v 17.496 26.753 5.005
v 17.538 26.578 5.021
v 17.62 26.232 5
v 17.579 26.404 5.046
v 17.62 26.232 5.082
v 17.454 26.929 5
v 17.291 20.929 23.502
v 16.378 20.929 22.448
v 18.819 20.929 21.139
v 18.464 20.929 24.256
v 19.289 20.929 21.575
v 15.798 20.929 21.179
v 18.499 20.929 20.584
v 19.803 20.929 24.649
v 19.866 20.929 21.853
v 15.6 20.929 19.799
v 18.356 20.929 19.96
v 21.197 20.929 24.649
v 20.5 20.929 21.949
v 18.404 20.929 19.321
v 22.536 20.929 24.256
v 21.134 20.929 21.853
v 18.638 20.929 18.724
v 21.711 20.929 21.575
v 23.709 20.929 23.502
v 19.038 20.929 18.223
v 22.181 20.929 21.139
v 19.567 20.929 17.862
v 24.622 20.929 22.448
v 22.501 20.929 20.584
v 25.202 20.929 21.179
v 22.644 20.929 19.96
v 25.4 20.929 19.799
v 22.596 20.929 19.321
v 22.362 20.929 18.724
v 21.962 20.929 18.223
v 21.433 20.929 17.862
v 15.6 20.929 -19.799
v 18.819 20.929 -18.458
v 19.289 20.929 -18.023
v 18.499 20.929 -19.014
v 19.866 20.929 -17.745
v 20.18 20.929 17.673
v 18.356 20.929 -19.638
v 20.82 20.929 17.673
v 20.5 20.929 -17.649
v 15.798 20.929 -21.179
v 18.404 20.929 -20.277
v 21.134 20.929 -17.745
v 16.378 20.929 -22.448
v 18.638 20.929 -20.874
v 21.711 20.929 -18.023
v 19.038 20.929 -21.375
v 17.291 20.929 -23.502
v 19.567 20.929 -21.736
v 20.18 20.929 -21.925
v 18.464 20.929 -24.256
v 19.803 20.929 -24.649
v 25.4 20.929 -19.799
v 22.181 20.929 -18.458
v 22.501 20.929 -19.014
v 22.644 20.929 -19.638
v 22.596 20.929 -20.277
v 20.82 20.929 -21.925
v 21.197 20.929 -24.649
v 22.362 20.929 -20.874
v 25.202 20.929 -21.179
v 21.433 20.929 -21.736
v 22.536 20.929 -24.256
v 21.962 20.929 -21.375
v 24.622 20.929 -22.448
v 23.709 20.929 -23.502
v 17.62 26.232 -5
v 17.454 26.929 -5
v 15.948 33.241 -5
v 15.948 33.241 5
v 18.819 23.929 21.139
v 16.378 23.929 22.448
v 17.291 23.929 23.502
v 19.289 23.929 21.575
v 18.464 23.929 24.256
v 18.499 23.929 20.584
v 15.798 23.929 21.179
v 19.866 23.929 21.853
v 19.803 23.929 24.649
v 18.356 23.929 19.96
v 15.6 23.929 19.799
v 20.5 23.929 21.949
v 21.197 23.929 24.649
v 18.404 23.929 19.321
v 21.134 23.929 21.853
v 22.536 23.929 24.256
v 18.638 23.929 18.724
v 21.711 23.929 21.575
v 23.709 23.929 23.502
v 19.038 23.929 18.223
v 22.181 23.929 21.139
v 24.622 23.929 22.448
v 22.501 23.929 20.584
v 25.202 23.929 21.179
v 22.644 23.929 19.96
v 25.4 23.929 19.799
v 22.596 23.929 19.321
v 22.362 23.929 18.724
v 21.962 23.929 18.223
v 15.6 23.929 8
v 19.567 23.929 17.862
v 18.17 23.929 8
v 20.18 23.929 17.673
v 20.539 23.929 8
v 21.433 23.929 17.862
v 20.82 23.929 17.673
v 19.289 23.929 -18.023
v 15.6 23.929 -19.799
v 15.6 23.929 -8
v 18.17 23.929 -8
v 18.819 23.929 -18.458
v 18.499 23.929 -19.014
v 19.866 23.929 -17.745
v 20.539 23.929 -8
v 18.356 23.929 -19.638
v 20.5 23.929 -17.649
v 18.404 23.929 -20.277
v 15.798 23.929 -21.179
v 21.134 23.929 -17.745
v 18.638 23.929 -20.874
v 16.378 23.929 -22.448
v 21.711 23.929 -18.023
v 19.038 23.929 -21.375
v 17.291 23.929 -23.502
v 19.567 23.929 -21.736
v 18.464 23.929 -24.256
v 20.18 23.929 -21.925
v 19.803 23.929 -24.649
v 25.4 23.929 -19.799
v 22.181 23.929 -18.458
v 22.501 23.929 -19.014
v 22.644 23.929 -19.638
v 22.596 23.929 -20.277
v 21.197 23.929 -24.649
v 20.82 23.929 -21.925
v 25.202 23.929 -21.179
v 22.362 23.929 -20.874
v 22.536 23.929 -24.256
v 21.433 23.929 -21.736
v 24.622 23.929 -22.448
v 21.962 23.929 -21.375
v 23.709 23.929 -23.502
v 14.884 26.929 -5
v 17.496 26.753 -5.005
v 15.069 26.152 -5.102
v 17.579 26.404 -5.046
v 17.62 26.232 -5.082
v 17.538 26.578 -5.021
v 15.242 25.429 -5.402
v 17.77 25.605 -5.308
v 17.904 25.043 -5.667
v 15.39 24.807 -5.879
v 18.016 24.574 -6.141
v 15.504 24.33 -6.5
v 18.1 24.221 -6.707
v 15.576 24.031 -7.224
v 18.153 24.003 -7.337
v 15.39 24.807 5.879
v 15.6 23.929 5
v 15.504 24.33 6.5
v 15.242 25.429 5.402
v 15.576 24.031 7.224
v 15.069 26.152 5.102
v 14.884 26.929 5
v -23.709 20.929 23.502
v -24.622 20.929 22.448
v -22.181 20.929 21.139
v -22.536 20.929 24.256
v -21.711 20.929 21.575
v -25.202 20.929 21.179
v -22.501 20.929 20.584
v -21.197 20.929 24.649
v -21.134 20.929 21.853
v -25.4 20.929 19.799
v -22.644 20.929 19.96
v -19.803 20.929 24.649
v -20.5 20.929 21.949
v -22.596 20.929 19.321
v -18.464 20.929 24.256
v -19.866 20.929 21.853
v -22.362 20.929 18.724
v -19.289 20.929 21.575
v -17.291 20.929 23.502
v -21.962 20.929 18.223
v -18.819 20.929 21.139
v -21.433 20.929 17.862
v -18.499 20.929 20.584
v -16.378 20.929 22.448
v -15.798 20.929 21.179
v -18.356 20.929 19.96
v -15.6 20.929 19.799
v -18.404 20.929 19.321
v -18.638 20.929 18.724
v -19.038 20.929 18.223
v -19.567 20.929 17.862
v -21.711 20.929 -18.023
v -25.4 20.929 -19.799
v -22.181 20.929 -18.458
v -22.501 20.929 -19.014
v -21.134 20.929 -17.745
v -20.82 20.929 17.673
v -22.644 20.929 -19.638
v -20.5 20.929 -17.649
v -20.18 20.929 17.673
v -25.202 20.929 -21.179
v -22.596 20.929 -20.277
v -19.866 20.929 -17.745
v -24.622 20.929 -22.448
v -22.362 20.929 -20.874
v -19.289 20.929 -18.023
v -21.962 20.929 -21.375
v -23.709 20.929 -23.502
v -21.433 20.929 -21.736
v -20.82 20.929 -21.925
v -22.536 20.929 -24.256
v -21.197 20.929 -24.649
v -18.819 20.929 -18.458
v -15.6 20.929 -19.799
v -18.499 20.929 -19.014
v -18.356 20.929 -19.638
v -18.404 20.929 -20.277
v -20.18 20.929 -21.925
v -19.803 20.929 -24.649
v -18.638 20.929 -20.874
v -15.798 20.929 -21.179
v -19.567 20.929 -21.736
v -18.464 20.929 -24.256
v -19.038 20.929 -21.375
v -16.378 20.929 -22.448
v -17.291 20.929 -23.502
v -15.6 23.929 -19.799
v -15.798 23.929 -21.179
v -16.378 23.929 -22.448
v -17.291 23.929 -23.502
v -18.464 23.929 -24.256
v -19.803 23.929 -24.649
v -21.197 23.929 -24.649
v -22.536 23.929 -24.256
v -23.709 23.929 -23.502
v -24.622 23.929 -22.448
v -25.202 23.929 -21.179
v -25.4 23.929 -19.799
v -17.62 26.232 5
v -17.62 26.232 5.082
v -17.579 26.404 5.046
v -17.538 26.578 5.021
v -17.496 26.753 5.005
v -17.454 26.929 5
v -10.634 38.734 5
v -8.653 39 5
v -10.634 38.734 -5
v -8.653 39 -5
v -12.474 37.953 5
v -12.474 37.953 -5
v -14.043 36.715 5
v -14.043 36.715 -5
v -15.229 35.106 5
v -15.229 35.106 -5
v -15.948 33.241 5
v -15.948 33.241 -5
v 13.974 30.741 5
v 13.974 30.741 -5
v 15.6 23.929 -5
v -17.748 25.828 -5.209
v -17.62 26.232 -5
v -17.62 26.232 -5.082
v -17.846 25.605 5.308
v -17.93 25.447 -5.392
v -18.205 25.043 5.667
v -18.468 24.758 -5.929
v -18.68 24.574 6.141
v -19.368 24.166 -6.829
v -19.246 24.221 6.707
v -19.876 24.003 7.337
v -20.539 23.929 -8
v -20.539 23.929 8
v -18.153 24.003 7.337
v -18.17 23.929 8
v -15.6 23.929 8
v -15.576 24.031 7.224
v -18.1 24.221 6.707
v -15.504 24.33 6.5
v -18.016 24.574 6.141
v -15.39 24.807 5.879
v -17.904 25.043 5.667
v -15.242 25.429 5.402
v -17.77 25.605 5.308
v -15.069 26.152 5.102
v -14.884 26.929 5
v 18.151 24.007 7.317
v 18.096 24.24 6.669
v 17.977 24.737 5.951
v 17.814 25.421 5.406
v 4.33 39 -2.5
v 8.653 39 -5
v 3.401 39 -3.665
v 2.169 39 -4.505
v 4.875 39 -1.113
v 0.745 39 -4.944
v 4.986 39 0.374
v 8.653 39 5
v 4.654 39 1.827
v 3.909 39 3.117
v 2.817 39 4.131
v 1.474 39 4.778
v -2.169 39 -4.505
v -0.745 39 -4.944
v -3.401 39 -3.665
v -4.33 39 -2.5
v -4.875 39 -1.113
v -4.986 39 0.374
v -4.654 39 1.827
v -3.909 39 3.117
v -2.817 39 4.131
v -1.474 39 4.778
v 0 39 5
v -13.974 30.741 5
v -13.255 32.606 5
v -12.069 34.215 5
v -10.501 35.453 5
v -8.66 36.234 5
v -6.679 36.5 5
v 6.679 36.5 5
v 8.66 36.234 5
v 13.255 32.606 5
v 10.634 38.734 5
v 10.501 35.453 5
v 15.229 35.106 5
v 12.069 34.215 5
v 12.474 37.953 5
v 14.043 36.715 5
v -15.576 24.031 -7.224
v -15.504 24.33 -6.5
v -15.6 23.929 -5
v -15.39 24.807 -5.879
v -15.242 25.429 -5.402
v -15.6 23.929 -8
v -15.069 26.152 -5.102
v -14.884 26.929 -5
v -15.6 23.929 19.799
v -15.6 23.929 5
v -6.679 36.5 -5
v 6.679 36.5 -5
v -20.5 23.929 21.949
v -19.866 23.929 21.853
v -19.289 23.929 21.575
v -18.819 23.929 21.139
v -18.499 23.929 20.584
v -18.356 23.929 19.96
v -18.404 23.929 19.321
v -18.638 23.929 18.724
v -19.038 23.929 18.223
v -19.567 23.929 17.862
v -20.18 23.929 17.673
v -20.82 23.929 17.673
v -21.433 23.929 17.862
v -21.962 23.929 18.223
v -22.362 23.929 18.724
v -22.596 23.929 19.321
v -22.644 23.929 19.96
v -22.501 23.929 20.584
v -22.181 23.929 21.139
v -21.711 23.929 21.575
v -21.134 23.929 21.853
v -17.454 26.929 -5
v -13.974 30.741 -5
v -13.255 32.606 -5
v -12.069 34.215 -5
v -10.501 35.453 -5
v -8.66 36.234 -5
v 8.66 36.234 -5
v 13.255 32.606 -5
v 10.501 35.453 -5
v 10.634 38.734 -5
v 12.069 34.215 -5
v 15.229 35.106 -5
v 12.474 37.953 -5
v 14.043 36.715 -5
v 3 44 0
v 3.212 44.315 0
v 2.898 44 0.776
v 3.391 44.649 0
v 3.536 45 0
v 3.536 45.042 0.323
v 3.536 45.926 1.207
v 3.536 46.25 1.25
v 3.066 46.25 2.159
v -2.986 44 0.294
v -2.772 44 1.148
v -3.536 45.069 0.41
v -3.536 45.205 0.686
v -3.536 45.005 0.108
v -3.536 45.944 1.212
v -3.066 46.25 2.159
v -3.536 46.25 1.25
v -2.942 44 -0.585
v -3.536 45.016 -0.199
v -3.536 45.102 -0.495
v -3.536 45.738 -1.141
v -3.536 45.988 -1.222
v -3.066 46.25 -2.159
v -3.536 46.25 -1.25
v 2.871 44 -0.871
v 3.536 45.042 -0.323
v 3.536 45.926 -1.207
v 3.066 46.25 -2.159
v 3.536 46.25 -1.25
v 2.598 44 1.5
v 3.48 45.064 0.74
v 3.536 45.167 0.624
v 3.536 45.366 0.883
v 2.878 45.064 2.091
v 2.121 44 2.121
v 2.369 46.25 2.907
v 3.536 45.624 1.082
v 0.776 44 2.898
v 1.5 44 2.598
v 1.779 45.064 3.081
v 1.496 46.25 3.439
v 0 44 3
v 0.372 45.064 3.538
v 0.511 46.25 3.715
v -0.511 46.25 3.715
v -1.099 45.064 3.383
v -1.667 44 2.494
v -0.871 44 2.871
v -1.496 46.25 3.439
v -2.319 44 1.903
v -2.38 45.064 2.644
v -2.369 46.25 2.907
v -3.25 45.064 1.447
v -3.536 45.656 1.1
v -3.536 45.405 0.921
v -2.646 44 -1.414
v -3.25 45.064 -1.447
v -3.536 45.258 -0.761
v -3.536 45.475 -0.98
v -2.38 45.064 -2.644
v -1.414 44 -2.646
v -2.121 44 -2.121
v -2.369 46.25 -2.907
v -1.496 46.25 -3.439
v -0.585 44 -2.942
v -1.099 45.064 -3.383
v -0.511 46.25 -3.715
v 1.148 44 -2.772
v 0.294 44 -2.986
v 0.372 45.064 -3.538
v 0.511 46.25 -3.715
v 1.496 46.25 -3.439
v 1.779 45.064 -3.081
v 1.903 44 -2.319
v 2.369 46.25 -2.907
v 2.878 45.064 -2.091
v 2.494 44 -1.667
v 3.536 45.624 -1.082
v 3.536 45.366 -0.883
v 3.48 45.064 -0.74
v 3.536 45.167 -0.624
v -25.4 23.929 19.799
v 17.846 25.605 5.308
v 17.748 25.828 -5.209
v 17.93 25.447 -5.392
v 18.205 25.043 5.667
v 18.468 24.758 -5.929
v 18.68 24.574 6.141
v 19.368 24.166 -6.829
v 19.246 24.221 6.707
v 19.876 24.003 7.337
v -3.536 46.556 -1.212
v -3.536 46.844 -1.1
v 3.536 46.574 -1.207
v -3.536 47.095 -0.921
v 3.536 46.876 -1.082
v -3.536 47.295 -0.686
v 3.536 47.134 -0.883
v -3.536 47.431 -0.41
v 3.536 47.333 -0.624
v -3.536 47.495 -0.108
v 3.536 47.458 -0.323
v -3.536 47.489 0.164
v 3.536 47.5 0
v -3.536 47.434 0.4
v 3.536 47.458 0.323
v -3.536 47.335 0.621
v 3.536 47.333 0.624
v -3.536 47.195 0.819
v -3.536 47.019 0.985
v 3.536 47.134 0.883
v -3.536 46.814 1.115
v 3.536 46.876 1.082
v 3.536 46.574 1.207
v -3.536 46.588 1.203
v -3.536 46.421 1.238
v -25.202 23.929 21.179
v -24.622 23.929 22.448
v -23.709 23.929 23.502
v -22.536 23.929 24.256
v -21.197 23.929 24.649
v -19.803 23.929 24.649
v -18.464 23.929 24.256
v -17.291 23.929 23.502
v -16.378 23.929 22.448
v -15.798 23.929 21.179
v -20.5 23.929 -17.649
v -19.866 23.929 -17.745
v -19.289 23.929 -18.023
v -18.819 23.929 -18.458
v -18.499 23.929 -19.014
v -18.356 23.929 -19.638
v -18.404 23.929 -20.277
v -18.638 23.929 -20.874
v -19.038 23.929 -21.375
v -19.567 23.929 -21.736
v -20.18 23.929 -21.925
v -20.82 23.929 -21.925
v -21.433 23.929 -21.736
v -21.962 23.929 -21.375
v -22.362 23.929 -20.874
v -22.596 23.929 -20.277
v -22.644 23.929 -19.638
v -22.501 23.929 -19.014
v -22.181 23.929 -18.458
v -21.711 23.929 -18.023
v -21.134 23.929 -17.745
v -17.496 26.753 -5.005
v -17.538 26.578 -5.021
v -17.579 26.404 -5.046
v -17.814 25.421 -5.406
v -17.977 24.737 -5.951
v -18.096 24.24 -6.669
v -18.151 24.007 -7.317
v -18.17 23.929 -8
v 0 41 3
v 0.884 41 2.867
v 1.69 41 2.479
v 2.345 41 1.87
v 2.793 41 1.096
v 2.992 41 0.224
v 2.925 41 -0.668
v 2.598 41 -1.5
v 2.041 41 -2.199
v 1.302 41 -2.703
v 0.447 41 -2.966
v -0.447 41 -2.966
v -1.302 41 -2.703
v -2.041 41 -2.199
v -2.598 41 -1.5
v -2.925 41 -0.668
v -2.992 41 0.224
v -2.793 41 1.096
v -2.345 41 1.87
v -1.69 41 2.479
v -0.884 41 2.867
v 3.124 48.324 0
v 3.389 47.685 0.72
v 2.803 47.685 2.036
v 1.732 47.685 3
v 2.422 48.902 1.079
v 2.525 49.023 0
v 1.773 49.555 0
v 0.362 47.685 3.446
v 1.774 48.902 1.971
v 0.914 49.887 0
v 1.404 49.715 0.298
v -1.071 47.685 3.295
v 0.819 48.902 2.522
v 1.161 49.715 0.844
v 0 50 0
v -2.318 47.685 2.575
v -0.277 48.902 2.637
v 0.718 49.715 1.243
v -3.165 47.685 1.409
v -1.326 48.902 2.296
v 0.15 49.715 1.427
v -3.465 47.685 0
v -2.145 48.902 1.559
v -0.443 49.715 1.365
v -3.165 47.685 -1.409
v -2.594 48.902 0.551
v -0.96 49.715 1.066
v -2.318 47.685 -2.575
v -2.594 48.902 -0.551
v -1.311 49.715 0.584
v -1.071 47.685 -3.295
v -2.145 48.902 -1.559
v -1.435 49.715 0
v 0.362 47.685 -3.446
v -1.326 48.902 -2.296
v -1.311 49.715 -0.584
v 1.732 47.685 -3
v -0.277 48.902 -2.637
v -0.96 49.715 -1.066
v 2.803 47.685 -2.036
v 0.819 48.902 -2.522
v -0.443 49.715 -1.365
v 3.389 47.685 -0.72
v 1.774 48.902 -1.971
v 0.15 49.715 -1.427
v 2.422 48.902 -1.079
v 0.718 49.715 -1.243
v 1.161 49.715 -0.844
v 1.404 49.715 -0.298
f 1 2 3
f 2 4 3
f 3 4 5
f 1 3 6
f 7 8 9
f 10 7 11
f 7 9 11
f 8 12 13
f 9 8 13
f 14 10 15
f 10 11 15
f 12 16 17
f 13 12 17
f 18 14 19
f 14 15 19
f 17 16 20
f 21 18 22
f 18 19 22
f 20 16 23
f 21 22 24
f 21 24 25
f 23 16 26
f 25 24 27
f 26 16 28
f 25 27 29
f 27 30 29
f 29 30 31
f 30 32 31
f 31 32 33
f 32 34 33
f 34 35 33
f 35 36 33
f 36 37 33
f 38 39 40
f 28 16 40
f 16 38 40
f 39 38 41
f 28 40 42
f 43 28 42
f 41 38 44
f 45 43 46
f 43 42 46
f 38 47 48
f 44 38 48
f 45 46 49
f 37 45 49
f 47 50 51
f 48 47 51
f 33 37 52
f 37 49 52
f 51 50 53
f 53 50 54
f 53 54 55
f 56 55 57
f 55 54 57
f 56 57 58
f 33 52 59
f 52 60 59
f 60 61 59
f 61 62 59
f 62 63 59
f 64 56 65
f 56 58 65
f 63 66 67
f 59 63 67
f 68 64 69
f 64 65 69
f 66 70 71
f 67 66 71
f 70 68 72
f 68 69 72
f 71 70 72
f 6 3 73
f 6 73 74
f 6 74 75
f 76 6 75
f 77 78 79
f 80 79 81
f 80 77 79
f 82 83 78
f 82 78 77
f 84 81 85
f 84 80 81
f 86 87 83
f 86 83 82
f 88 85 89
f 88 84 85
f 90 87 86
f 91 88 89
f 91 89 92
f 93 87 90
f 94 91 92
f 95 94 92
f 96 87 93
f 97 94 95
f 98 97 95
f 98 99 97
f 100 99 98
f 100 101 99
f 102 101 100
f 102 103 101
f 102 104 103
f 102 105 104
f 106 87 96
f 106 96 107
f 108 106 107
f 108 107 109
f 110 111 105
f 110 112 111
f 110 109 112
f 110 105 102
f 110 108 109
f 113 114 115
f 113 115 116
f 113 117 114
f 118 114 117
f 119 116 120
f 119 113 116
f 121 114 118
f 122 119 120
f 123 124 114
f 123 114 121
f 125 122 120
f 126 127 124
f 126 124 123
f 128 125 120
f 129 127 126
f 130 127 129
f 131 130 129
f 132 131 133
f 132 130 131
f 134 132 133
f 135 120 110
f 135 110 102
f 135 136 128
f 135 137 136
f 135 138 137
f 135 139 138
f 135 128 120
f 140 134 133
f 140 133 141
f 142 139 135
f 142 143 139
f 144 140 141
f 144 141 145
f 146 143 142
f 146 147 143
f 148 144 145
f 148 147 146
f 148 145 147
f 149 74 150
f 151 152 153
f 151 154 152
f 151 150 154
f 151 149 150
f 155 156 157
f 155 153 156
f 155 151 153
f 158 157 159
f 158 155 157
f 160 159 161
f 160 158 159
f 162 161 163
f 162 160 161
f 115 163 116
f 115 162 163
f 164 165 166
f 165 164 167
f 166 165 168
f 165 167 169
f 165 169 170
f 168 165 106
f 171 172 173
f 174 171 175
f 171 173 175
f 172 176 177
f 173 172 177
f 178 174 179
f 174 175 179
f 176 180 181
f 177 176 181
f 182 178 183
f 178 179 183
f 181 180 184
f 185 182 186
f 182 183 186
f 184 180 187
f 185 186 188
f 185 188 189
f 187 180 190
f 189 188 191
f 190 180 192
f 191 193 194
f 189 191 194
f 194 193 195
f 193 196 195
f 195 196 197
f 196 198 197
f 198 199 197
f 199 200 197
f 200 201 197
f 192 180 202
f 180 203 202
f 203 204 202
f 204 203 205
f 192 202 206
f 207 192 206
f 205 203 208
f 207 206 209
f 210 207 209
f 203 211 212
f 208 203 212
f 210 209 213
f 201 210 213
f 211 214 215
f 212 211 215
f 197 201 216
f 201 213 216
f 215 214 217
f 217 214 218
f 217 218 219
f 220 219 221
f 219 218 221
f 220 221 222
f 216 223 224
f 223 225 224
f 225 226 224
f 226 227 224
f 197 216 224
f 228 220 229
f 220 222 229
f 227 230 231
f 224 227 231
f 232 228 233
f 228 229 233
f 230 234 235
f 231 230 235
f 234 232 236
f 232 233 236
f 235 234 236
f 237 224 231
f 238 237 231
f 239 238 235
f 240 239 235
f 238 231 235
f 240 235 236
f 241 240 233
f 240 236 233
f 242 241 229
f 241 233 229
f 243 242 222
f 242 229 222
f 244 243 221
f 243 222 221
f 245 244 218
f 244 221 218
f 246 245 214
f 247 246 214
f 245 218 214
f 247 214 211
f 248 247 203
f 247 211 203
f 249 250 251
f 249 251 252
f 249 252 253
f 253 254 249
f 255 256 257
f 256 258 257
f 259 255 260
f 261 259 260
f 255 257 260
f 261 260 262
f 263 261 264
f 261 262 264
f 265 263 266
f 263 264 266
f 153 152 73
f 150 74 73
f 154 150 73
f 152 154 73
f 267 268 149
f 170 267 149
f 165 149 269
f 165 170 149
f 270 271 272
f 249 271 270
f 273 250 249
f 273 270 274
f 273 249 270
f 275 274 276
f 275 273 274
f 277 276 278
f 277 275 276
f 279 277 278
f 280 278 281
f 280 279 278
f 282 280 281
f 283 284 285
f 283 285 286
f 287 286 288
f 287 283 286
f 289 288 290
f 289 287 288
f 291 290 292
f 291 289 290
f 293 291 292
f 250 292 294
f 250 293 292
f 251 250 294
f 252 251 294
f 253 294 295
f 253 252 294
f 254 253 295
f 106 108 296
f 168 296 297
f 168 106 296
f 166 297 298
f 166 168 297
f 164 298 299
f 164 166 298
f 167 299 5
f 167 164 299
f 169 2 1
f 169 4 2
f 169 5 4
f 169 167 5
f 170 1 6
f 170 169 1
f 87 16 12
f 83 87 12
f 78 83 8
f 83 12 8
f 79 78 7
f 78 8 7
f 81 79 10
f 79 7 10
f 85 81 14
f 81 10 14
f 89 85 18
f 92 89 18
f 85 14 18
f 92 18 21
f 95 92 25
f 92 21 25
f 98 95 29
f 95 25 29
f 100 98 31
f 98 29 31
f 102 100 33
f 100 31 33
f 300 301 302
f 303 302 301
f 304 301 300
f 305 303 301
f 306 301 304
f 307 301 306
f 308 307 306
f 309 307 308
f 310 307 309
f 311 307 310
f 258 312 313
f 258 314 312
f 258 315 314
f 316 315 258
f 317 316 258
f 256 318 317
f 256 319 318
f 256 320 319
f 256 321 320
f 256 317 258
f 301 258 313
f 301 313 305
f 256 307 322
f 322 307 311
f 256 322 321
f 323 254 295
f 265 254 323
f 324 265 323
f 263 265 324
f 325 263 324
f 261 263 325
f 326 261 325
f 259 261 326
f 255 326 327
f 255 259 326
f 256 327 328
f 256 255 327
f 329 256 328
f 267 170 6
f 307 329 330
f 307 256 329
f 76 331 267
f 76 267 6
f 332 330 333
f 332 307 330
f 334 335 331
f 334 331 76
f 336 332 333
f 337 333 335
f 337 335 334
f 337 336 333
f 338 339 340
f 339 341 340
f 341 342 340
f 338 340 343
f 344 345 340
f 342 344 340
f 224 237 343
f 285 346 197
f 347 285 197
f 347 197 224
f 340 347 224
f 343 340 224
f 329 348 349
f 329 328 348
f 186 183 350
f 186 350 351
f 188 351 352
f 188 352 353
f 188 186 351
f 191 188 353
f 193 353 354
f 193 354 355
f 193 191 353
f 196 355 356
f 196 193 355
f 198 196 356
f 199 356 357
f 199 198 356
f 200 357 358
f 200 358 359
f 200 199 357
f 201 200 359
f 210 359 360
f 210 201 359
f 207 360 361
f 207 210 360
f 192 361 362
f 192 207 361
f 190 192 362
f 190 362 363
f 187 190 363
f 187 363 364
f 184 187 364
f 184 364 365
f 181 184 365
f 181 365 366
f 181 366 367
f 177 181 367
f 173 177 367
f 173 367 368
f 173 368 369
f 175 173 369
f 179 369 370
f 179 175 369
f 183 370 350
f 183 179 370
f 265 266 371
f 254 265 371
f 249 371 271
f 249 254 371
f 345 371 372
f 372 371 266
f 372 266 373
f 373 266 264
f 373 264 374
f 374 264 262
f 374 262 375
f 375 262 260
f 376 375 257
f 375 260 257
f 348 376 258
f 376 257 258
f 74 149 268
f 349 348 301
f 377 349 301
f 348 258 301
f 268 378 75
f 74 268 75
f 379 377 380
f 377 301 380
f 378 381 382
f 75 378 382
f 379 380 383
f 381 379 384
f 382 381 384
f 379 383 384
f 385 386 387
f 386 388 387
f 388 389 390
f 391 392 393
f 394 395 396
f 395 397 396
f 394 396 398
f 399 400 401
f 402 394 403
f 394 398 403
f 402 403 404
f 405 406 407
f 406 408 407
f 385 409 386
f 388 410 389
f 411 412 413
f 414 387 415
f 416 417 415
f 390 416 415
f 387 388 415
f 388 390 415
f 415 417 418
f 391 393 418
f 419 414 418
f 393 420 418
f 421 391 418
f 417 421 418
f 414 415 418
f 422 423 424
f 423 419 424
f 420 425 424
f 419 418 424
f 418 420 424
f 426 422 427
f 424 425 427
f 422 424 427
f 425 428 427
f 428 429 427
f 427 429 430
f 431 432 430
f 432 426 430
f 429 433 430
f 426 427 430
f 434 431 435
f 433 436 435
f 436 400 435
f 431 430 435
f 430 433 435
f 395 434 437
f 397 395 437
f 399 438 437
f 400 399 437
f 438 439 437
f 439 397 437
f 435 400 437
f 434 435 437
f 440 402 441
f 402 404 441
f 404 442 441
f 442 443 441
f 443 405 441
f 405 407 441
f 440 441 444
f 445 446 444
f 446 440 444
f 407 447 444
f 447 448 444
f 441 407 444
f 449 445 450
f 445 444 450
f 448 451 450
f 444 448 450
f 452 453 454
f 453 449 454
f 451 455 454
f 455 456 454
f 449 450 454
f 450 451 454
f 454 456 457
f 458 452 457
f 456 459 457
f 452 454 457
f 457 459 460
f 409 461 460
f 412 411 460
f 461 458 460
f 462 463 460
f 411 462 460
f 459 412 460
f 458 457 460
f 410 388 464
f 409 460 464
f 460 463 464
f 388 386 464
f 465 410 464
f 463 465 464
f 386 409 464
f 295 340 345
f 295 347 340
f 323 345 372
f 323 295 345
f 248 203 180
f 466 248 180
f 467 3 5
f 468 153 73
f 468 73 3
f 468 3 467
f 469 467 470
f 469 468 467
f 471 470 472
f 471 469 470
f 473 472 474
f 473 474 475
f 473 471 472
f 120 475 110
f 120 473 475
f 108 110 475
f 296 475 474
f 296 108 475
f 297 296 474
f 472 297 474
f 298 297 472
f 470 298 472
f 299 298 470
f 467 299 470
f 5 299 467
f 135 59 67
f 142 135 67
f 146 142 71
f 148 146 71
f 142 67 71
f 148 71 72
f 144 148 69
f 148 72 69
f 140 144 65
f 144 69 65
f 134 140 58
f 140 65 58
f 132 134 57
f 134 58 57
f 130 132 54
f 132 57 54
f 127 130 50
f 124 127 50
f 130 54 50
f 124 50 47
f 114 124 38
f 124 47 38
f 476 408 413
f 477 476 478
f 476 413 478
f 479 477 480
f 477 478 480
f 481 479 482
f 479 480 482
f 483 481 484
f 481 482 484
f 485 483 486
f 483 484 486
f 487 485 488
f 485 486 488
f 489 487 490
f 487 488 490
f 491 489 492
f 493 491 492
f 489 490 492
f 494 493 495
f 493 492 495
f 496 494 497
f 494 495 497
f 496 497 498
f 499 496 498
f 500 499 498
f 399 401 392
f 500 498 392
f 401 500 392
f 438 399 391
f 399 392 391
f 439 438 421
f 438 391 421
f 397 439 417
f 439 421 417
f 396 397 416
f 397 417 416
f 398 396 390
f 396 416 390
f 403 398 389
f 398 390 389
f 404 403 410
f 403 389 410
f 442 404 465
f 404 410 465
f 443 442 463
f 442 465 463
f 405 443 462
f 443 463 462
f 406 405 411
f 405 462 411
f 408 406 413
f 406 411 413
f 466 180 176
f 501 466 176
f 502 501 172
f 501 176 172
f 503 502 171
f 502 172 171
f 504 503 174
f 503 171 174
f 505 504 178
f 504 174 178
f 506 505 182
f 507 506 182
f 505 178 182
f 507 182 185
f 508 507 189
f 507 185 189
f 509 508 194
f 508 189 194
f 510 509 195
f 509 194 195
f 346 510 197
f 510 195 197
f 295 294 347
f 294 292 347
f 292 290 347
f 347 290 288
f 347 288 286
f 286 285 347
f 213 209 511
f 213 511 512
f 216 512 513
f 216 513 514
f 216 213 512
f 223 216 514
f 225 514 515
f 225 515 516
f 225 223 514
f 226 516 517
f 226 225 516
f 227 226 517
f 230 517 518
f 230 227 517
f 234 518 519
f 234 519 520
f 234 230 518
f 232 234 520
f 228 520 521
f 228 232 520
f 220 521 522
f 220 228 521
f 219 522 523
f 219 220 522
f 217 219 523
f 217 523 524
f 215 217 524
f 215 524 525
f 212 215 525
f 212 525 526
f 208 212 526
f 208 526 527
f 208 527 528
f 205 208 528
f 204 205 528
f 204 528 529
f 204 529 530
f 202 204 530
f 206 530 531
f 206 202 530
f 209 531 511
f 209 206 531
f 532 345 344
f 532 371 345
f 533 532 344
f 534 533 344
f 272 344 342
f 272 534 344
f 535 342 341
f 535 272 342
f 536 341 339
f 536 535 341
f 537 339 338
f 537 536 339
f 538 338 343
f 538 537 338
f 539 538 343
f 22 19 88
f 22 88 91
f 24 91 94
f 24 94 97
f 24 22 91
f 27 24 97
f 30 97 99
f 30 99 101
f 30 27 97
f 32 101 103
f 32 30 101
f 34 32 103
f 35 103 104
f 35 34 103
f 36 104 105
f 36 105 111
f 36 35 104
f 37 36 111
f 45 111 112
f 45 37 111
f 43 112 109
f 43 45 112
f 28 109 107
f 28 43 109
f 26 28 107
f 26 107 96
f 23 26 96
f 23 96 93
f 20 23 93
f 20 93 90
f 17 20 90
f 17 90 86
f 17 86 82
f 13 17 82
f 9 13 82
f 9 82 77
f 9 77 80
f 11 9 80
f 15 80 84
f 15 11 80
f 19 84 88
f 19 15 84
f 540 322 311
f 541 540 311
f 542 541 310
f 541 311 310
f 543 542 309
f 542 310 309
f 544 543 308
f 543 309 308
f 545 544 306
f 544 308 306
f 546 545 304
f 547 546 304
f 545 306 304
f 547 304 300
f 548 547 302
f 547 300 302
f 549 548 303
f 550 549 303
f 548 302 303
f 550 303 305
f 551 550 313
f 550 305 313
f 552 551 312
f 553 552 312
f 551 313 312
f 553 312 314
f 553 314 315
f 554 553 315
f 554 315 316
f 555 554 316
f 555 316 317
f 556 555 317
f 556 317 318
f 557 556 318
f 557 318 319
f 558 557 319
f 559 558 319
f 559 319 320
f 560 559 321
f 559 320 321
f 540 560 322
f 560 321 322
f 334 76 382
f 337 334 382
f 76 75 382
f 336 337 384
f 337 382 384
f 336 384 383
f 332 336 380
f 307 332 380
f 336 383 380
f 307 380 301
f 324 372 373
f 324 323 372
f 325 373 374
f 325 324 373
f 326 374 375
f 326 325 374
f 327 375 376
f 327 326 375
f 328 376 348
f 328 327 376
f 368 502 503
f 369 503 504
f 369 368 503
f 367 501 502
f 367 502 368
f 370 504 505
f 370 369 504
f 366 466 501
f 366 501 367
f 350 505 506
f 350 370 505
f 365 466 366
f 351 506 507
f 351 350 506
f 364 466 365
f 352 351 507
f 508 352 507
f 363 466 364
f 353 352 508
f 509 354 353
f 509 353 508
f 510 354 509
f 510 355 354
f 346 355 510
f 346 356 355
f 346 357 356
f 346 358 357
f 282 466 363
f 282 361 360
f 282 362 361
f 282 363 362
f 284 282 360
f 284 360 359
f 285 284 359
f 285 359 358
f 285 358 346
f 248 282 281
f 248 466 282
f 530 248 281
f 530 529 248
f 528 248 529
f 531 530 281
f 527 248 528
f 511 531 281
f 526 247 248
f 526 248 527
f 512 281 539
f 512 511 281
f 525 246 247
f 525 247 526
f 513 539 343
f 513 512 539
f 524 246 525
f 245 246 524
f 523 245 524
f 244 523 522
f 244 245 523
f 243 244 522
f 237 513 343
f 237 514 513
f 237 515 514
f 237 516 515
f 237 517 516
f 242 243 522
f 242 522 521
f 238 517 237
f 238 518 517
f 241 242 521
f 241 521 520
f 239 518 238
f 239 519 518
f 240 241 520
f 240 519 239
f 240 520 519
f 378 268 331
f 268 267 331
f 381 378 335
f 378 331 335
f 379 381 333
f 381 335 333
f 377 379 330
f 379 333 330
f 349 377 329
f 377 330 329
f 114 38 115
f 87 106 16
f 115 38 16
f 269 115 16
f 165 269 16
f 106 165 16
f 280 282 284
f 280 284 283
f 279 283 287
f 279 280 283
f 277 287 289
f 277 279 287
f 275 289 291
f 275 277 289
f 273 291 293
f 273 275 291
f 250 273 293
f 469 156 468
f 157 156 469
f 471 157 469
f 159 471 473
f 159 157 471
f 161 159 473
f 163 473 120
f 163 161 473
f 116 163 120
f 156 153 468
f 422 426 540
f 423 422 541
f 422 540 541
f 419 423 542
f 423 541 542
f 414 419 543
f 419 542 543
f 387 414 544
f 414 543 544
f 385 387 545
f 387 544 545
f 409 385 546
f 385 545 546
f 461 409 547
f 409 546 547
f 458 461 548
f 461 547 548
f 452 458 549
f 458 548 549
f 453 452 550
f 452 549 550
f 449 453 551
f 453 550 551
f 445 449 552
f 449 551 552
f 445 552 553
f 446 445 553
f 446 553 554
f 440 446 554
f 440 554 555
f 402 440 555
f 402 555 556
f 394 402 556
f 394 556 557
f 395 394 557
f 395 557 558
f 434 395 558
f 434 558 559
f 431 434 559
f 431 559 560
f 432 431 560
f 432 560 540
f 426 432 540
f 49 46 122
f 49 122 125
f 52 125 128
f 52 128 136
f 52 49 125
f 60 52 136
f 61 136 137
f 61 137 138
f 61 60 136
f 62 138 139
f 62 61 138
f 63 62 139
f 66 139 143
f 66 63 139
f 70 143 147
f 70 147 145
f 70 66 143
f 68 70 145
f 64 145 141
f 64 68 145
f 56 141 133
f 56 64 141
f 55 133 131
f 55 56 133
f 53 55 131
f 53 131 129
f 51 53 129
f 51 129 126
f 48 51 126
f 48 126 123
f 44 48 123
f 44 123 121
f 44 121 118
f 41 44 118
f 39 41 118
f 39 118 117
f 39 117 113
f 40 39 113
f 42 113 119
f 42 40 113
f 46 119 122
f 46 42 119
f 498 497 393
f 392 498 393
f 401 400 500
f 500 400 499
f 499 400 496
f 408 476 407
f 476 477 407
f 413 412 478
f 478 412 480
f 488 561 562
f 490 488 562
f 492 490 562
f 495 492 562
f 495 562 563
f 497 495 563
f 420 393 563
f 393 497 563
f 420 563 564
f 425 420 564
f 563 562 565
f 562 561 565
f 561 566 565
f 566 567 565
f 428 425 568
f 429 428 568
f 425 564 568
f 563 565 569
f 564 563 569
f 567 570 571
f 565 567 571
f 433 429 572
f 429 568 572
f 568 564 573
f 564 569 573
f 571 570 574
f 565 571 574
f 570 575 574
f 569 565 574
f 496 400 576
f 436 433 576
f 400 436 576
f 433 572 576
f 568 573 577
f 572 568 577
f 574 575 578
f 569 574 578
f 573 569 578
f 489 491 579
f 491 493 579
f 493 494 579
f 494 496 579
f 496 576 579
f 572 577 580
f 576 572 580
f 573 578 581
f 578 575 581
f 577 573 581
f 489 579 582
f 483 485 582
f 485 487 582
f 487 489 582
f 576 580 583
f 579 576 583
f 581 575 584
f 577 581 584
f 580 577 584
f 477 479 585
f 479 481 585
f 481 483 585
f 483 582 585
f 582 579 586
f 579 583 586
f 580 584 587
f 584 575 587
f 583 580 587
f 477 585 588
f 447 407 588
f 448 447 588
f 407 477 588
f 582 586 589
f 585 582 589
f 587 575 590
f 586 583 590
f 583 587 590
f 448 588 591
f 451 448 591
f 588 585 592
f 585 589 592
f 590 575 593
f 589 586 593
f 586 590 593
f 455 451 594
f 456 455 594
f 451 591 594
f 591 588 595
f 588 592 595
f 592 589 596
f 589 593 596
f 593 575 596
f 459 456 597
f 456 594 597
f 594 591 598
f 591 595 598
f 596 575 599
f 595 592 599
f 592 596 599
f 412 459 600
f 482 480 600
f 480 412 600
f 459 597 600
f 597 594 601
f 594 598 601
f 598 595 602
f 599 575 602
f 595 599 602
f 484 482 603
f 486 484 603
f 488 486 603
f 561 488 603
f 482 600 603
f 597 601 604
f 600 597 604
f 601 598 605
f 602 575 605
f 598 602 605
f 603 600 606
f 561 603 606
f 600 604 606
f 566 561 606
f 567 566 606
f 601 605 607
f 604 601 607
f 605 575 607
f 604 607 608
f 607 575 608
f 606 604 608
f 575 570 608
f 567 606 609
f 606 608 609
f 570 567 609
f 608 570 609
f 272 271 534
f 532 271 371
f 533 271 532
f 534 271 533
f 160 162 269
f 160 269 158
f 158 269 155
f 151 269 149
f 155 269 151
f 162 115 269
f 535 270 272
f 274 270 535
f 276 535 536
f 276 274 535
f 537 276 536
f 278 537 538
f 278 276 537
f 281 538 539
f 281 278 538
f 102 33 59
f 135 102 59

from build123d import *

# Parameters (mm, degrees)
SKETCH_4_R          = 4.9
SKETCH_4_R_2        = 2.15
EXTRUDE_1_DEPTH     = 3
EXTRUDE_2_DEPTH     = 5
FILLET_1_R          = 7.5
FILLET_2_R          = 3
SKETCH_8_R          = 3
EXTRUDE_3_DEPTH     = 5
SKETCH_10_R         = 1.25
CUT_EXTRUDE_1_DEPTH = 5
CHAMFER_1_SIZE      = 2


# Some blends are built 0.0001 mm under size
with BuildPart() as part:
    # ｽｹｯﾁ4 → ﾎﾞｽ - 押し出し1 (new body)
    # profile 1 of 6: a face of its own
    with BuildSketch(Plane(origin=(0, 20.928505024, 0), x_dir=(1, 0, 0), z_dir=(0, 1, 0))):
        with Locations((-20.5, 19.798989873)):
            Circle(SKETCH_4_R)
        with Locations(Location((-20.5, 19.798989873, 0), (0, 0, 270))):
            Circle(SKETCH_4_R_2, mode=Mode.SUBTRACT)
    # profile 2 of 6: a face of its own
    with BuildSketch(Plane(origin=(0, 20.928505024, 0), x_dir=(1, 0, 0), z_dir=(0, 1, 0))):
        with BuildLine():
            Line((-15.6, -19.798989873), (-15.6, 19.798989873))
            ThreePointArc((-15.6, 19.798989873), (-20.5, 14.898989873), (-25.4, 19.798989873))
            Line((-25.4, 19.798989873), (-25.4, -19.798989873))
            ThreePointArc((-25.4, -19.798989873), (-20.5, -14.898989873), (-15.6, -19.798989873))
        make_face()
    # profile 3 of 6: a face of its own
    with BuildSketch(Plane(origin=(0, 20.928505024, 0), x_dir=(1, 0, 0), z_dir=(0, 1, 0))):
        with Locations((-20.5, -19.798989873)):
            Circle(SKETCH_4_R)
        with Locations(Location((-20.5, -19.798989873, 0), (0, 0, 270))):
            Circle(SKETCH_4_R_2, mode=Mode.SUBTRACT)
    # profile 4 of 6: a face of its own
    with BuildSketch(Plane(origin=(0, 20.928505024, 0), x_dir=(1, 0, 0), z_dir=(0, 1, 0))):
        with BuildLine():
            Line((25.4, -19.798989873), (25.4, 19.798989873))
            ThreePointArc((25.4, 19.798989873), (20.5, 14.898989873), (15.6, 19.798989873))
            Line((15.6, 19.798989873), (15.6, -19.798989873))
            ThreePointArc((15.6, -19.798989873), (20.5, -14.898989873), (25.4, -19.798989873))
        make_face()
    # profile 5 of 6: a face of its own
    with BuildSketch(Plane(origin=(0, 20.928505024, 0), x_dir=(1, 0, 0), z_dir=(0, 1, 0))):
        with Locations((20.5, 19.798989873)):
            Circle(SKETCH_4_R)
        with Locations(Location((20.5, 19.798989873, 0), (0, 0, 270))):
            Circle(SKETCH_4_R_2, mode=Mode.SUBTRACT)
    # profile 6 of 6: a face of its own
    with BuildSketch(Plane(origin=(0, 20.928505024, 0), x_dir=(1, 0, 0), z_dir=(0, 1, 0))):
        with Locations((20.5, -19.798989873)):
            Circle(SKETCH_4_R)
        with Locations(Location((20.5, -19.798989873, 0), (0, 0, 270))):
            Circle(SKETCH_4_R_2, mode=Mode.SUBTRACT)
    extrude(amount=EXTRUDE_1_DEPTH)

    # ｽｹｯﾁ7 → ﾎﾞｽ - 押し出し2 (add, symmetric)
    with BuildSketch(Plane.XY):
        Polygon((-18.170197843, 23.928505024), (-15.6, 23.928505024), (-12.6, 36.5), (12.6, 36.5), (15.6, 23.928505024), (18.170197843, 23.928505024), (14.573610085, 39), (-14.573610085, 39), align=None)
    extrude(amount=EXTRUDE_2_DEPTH, both=True)

    # ﾌｨﾚｯﾄ1
    fillet_1_edges = [part.edges().sort_by_distance(p)[0] for p in [
        (14.573610085, 39, 0),
        (-14.573610085, 39, 0),
        (-12.6, 36.5, 0),
        (12.6, 36.5, 0),
    ]]
    fillet(fillet_1_edges, radius=FILLET_1_R)

    # ﾌｨﾚｯﾄ2
    # the kernel refuses this fillet: 3 mm, written as the material it adds along each edge
    with BuildSketch(Plane(origin=(-25.670197843, 23.928505024, -5), x_dir=(0, 1, 0), z_dir=(1, 0, 0))) as fillet_2_piece_1_section:
        with BuildLine():
            CenterArc((FILLET_2_R, -FILLET_2_R), FILLET_2_R, 90, 90)
            Line((0, -FILLET_2_R), (0, 0))
            Line((0, 0), (FILLET_2_R, 0))
        make_face()
    fillet_2_piece_1 = extrude(amount=10.070197843, mode=Mode.PRIVATE)
    fillet_2_piece_1 = split(fillet_2_piece_1, bisect_by=Plane(origin=(-15.521132181, 24.259000487, -5.703490697), z_dir=(-0.9726877666985287, 0.232117445520643, 0)), keep=Keep.TOP, mode=Mode.PRIVATE)
    fillet_2_piece_1 = split(fillet_2_piece_1, bisect_by=Plane(origin=(-17.952851598, 24.839294101, -5.703490697), z_dir=(0.9726877666985286, -0.23211744552064312, 0)), keep=Keep.TOP, mode=Mode.PRIVATE)
    add(fillet_2_piece_1)
    with BuildSketch(Plane(origin=(-25.670197843, 23.928505024, -5), x_dir=(0, 1, 0), z_dir=(1, 0, 0))) as fillet_2_piece_2_section:
        with BuildLine():
            CenterArc((FILLET_2_R, -FILLET_2_R), FILLET_2_R, 90, 90)
            Line((0, -FILLET_2_R), (0, 0))
            Line((0, 0), (FILLET_2_R, 0))
        make_face()
    fillet_2_piece_2 = extrude(amount=17.570197843, mode=Mode.PRIVATE)
    fillet_2_piece_2 = split(fillet_2_piece_2, bisect_by=Plane(origin=(-15.300371441, 25.184098001, -5.319417538), z_dir=(-0.9726877666985287, 0.232117445520643, 0)), keep=Keep.TOP, mode=Mode.PRIVATE)
    fillet_2_piece_2 = split(fillet_2_piece_2, bisect_by=Plane(origin=(-15.6, 25.218859179, -5.319417538), z_dir=(1, 0, 0)), keep=Keep.TOP, mode=Mode.PRIVATE)
    add(fillet_2_piece_2)
    with BuildSketch(Plane(origin=(-18.170197843, 23.928505024, 5), x_dir=(-1, 0, 0), z_dir=(0, 0, -1)), Plane(origin=(18.170197843, 23.928505024, -5), x_dir=(1, 0, 0), z_dir=(0, 0, 1))) as fillet_2_piece_3:
        with BuildLine():
            CenterArc((FILLET_2_R * 0.789444034118, FILLET_2_R), FILLET_2_R, 193.421766737, 76.578233263)
            Line((-FILLET_2_R * 0.183243732581, FILLET_2_R * 0.767882554479), (0, 0))
            Line((0, 0), (FILLET_2_R * 0.789444034118, 0))
        make_face()
    extrude(amount=10)
    with BuildSketch(Plane(origin=(8.1, 23.928505024, -5), x_dir=(0, 1, 0), z_dir=(1, 0, 0))) as fillet_2_piece_4_section:
        with BuildLine():
            CenterArc((FILLET_2_R, -FILLET_2_R), FILLET_2_R, 90, 90)
            Line((0, -FILLET_2_R), (0, 0))
            Line((0, 0), (FILLET_2_R, 0))
        make_face()
    fillet_2_piece_4 = extrude(amount=17.570197843, mode=Mode.PRIVATE)
    fillet_2_piece_4 = split(fillet_2_piece_4, bisect_by=Plane(origin=(15.300371441, 25.184098001, -5.319417538), z_dir=(0.9726877666985287, 0.23211744552064287, 0)), keep=Keep.TOP, mode=Mode.PRIVATE)
    fillet_2_piece_4 = split(fillet_2_piece_4, bisect_by=Plane(origin=(15.6, 25.218859179, -5.319417538), z_dir=(-1, 0, 0)), keep=Keep.TOP, mode=Mode.PRIVATE)
    add(fillet_2_piece_4)
    with BuildSketch(Plane(origin=(15.6, 23.928505024, -5), x_dir=(0, 1, 0), z_dir=(1, 0, 0))) as fillet_2_piece_5_section:
        with BuildLine():
            CenterArc((FILLET_2_R, -FILLET_2_R), FILLET_2_R, 90, 90)
            Line((0, -FILLET_2_R), (0, 0))
            Line((0, 0), (FILLET_2_R, 0))
        make_face()
    fillet_2_piece_5 = extrude(amount=10.070197843, mode=Mode.PRIVATE)
    fillet_2_piece_5 = split(fillet_2_piece_5, bisect_by=Plane(origin=(15.521132181, 24.259000487, -5.703490697), z_dir=(0.9726877666985287, 0.23211744552064287, 0)), keep=Keep.TOP, mode=Mode.PRIVATE)
    fillet_2_piece_5 = split(fillet_2_piece_5, bisect_by=Plane(origin=(17.952851598, 24.839294101, -5.703490697), z_dir=(-0.9726877666985286, -0.23211744552064312, 0)), keep=Keep.TOP, mode=Mode.PRIVATE)
    add(fillet_2_piece_5)
    with BuildSketch(Plane(origin=(-25.670197843, 23.928505024, 5), x_dir=(0, 1, 0), z_dir=(1, 0, 0))) as fillet_2_piece_6_section:
        with BuildLine():
            CenterArc((FILLET_2_R, FILLET_2_R), FILLET_2_R, 180, 90)
            Line((0, FILLET_2_R), (0, 0))
            Line((0, 0), (FILLET_2_R, 0))
        make_face()
    fillet_2_piece_6 = extrude(amount=10.070197843, mode=Mode.PRIVATE)
    fillet_2_piece_6 = split(fillet_2_piece_6, bisect_by=Plane(origin=(-15.521132181, 24.259000487, 5.703490697), z_dir=(-0.9726877666985287, 0.232117445520643, 0)), keep=Keep.TOP, mode=Mode.PRIVATE)
    fillet_2_piece_6 = split(fillet_2_piece_6, bisect_by=Plane(origin=(-17.952851598, 24.839294101, 5.703490697), z_dir=(0.9726877666985286, -0.23211744552064312, 0)), keep=Keep.TOP, mode=Mode.PRIVATE)
    add(fillet_2_piece_6)
    with BuildSketch(Plane(origin=(-25.670197843, 23.928505024, 5), x_dir=(0, 1, 0), z_dir=(1, 0, 0))) as fillet_2_piece_7_section:
        with BuildLine():
            CenterArc((FILLET_2_R, FILLET_2_R), FILLET_2_R, 180, 90)
            Line((0, FILLET_2_R), (0, 0))
            Line((0, 0), (FILLET_2_R, 0))
        make_face()
    fillet_2_piece_7 = extrude(amount=17.570197843, mode=Mode.PRIVATE)
    fillet_2_piece_7 = split(fillet_2_piece_7, bisect_by=Plane(origin=(-15.300371441, 25.184098001, 5.319417538), z_dir=(-0.9726877666985287, 0.232117445520643, 0)), keep=Keep.TOP, mode=Mode.PRIVATE)
    fillet_2_piece_7 = split(fillet_2_piece_7, bisect_by=Plane(origin=(-15.6, 25.218859179, 5.319417538), z_dir=(1, 0, 0)), keep=Keep.TOP, mode=Mode.PRIVATE)
    add(fillet_2_piece_7)
    with BuildSketch(Plane(origin=(8.1, 23.928505024, 5), x_dir=(0, 1, 0), z_dir=(1, 0, 0))) as fillet_2_piece_8_section:
        with BuildLine():
            CenterArc((FILLET_2_R, FILLET_2_R), FILLET_2_R, 180, 90)
            Line((0, FILLET_2_R), (0, 0))
            Line((0, 0), (FILLET_2_R, 0))
        make_face()
    fillet_2_piece_8 = extrude(amount=17.570197843, mode=Mode.PRIVATE)
    fillet_2_piece_8 = split(fillet_2_piece_8, bisect_by=Plane(origin=(15.300371441, 25.184098001, 5.319417538), z_dir=(0.9726877666985287, 0.23211744552064287, 0)), keep=Keep.TOP, mode=Mode.PRIVATE)
    fillet_2_piece_8 = split(fillet_2_piece_8, bisect_by=Plane(origin=(15.6, 25.218859179, 5.319417538), z_dir=(-1, 0, 0)), keep=Keep.TOP, mode=Mode.PRIVATE)
    add(fillet_2_piece_8)
    with BuildSketch(Plane(origin=(15.6, 23.928505024, 5), x_dir=(0, 1, 0), z_dir=(1, 0, 0))) as fillet_2_piece_9_section:
        with BuildLine():
            CenterArc((FILLET_2_R, FILLET_2_R), FILLET_2_R, 180, 90)
            Line((0, FILLET_2_R), (0, 0))
            Line((0, 0), (FILLET_2_R, 0))
        make_face()
    fillet_2_piece_9 = extrude(amount=10.070197843, mode=Mode.PRIVATE)
    fillet_2_piece_9 = split(fillet_2_piece_9, bisect_by=Plane(origin=(15.521132181, 24.259000487, 5.703490697), z_dir=(0.9726877666985287, 0.23211744552064287, 0)), keep=Keep.TOP, mode=Mode.PRIVATE)
    fillet_2_piece_9 = split(fillet_2_piece_9, bisect_by=Plane(origin=(17.952851598, 24.839294101, 5.703490697), z_dir=(-0.9726877666985286, -0.23211744552064312, 0)), keep=Keep.TOP, mode=Mode.PRIVATE)
    add(fillet_2_piece_9)
    with BuildSketch(Plane(origin=(-25.670197843, 23.928505024, -5), x_dir=(0, 1, 0), z_dir=(1, 0, 0))) as fillet_2_piece_10a_section:
        with BuildLine():
            CenterArc((FILLET_2_R, -FILLET_2_R), FILLET_2_R, 90, 90)
            Line((0, -FILLET_2_R), (0, 0))
            Line((0, 0), (FILLET_2_R, 0))
        make_face()
    fillet_2_piece_10a = extrude(amount=10.070197843, mode=Mode.PRIVATE)
    fillet_2_piece_10a = split(fillet_2_piece_10a, bisect_by=Plane(origin=(-18.204116429, 23.786369246, -5.671207776), z_dir=(-0.9726877666985286, 0.23211744552064312, 0)), keep=Keep.TOP, mode=Mode.PRIVATE)
    fillet_2_piece_10a = split(fillet_2_piece_10a, bisect_by=Plane(origin=(-25.4, 24.621194187, -5.671207776), z_dir=(1, 0, 0)), keep=Keep.TOP, mode=Mode.PRIVATE)
    with BuildSketch(Plane(origin=(-18.170197843, 23.928505024, 5), x_dir=(-1, 0, 0), z_dir=(0, 0, -1))) as fillet_2_piece_10b_section:
        with BuildLine():
            CenterArc((FILLET_2_R * 0.789444034118, FILLET_2_R), FILLET_2_R, 193.421766737, 76.578233263)
            Line((-FILLET_2_R * 0.183243732581, FILLET_2_R * 0.767882554479), (0, 0))
            Line((0, 0), (FILLET_2_R * 0.789444034118, 0))
        make_face()
    fillet_2_piece_10b = extrude(amount=15.920830256, mode=Mode.PRIVATE)
    fillet_2_piece_10b = split(fillet_2_piece_10b, bisect_by=Plane(origin=(-18.572539965, 24.43815752, -5), z_dir=(0, 0, -1)), keep=Keep.TOP, mode=Mode.PRIVATE)
    fillet_2_piece_10 = fillet_2_piece_10a & fillet_2_piece_10b
    add(fillet_2_piece_10)
    with BuildSketch(Plane(origin=(-25.670197843, 23.928505024, 5), x_dir=(0, 1, 0), z_dir=(1, 0, 0))) as fillet_2_piece_11a_section:
        with BuildLine():
            CenterArc((FILLET_2_R, FILLET_2_R), FILLET_2_R, 180, 90)
            Line((0, FILLET_2_R), (0, 0))
            Line((0, 0), (FILLET_2_R, 0))
        make_face()
    fillet_2_piece_11a = extrude(amount=10.070197843, mode=Mode.PRIVATE)
    fillet_2_piece_11a = split(fillet_2_piece_11a, bisect_by=Plane(origin=(-18.204116429, 23.786369246, 5.671207776), z_dir=(-0.9726877666985286, 0.23211744552064312, 0)), keep=Keep.TOP, mode=Mode.PRIVATE)
    fillet_2_piece_11a = split(fillet_2_piece_11a, bisect_by=Plane(origin=(-25.4, 24.621194187, 5.671207776), z_dir=(1, 0, 0)), keep=Keep.TOP, mode=Mode.PRIVATE)
    with BuildSketch(Plane(origin=(-18.170197843, 23.928505024, 10.920830256), x_dir=(-1, 0, 0), z_dir=(0, 0, -1))) as fillet_2_piece_11b_section:
        with BuildLine():
            CenterArc((FILLET_2_R * 0.789444034118, FILLET_2_R), FILLET_2_R, 193.421766737, 76.578233263)
            Line((-FILLET_2_R * 0.183243732581, FILLET_2_R * 0.767882554479), (0, 0))
            Line((0, 0), (FILLET_2_R * 0.789444034118, 0))
        make_face()
    fillet_2_piece_11b = extrude(amount=15.920830256, mode=Mode.PRIVATE)
    fillet_2_piece_11b = split(fillet_2_piece_11b, bisect_by=Plane(origin=(-18.572539965, 24.43815752, 5), z_dir=(0, 0, 1)), keep=Keep.TOP, mode=Mode.PRIVATE)
    fillet_2_piece_11 = fillet_2_piece_11a & fillet_2_piece_11b
    add(fillet_2_piece_11)
    with BuildSketch(Plane(origin=(15.6, 23.928505024, -5), x_dir=(0, 1, 0), z_dir=(1, 0, 0))) as fillet_2_piece_12a_section:
        with BuildLine():
            CenterArc((FILLET_2_R, -FILLET_2_R), FILLET_2_R, 90, 90)
            Line((0, -FILLET_2_R), (0, 0))
            Line((0, 0), (FILLET_2_R, 0))
        make_face()
    fillet_2_piece_12a = extrude(amount=10.070197843, mode=Mode.PRIVATE)
    fillet_2_piece_12a = split(fillet_2_piece_12a, bisect_by=Plane(origin=(18.204116429, 23.786369246, -5.671207776), z_dir=(0.9726877666985286, 0.23211744552064312, 0)), keep=Keep.TOP, mode=Mode.PRIVATE)
    fillet_2_piece_12a = split(fillet_2_piece_12a, bisect_by=Plane(origin=(25.4, 24.621194187, -5.671207776), z_dir=(-1, 0, 0)), keep=Keep.TOP, mode=Mode.PRIVATE)
    with BuildSketch(Plane(origin=(18.170197843, 23.928505024, -10.920830256), x_dir=(1, 0, 0), z_dir=(0, 0, 1))) as fillet_2_piece_12b_section:
        with BuildLine():
            CenterArc((FILLET_2_R * 0.789444034118, FILLET_2_R), FILLET_2_R, 193.421766737, 76.578233263)
            Line((-FILLET_2_R * 0.183243732581, FILLET_2_R * 0.767882554479), (0, 0))
            Line((0, 0), (FILLET_2_R * 0.789444034118, 0))
        make_face()
    fillet_2_piece_12b = extrude(amount=15.920830256, mode=Mode.PRIVATE)
    fillet_2_piece_12b = split(fillet_2_piece_12b, bisect_by=Plane(origin=(18.572539965, 24.43815752, -5), z_dir=(0, 0, -1)), keep=Keep.TOP, mode=Mode.PRIVATE)
    fillet_2_piece_12 = fillet_2_piece_12a & fillet_2_piece_12b
    add(fillet_2_piece_12)
    with BuildSketch(Plane(origin=(15.6, 23.928505024, 5), x_dir=(0, 1, 0), z_dir=(1, 0, 0))) as fillet_2_piece_13a_section:
        with BuildLine():
            CenterArc((FILLET_2_R, FILLET_2_R), FILLET_2_R, 180, 90)
            Line((0, FILLET_2_R), (0, 0))
            Line((0, 0), (FILLET_2_R, 0))
        make_face()
    fillet_2_piece_13a = extrude(amount=10.070197843, mode=Mode.PRIVATE)
    fillet_2_piece_13a = split(fillet_2_piece_13a, bisect_by=Plane(origin=(18.204116429, 23.786369246, 5.671207776), z_dir=(0.9726877666985286, 0.23211744552064312, 0)), keep=Keep.TOP, mode=Mode.PRIVATE)
    fillet_2_piece_13a = split(fillet_2_piece_13a, bisect_by=Plane(origin=(25.4, 24.621194187, 5.671207776), z_dir=(-1, 0, 0)), keep=Keep.TOP, mode=Mode.PRIVATE)
    with BuildSketch(Plane(origin=(18.170197843, 23.928505024, -5), x_dir=(1, 0, 0), z_dir=(0, 0, 1))) as fillet_2_piece_13b_section:
        with BuildLine():
            CenterArc((FILLET_2_R * 0.789444034118, FILLET_2_R), FILLET_2_R, 193.421766737, 76.578233263)
            Line((-FILLET_2_R * 0.183243732581, FILLET_2_R * 0.767882554479), (0, 0))
            Line((0, 0), (FILLET_2_R * 0.789444034118, 0))
        make_face()
    fillet_2_piece_13b = extrude(amount=15.920830256, mode=Mode.PRIVATE)
    fillet_2_piece_13b = split(fillet_2_piece_13b, bisect_by=Plane(origin=(18.572539965, 24.43815752, 5), z_dir=(0, 0, 1)), keep=Keep.TOP, mode=Mode.PRIVATE)
    fillet_2_piece_13 = fillet_2_piece_13a & fillet_2_piece_13b
    add(fillet_2_piece_13)

    # ｽｹｯﾁ8 → ﾎﾞｽ - 押し出し3 (add)
    with BuildSketch(Plane(origin=(0, 39, 0), x_dir=(1, 0, 0), z_dir=(0, 1, 0))):
        with Locations(Location((0, 0, 0), (0, 0, 270))):
            Circle(SKETCH_8_R)
    extrude(amount=EXTRUDE_3_DEPTH)

    # ｽｹｯﾁ9 one side → 回転1 (revolve)
    with BuildSketch(Plane.XY):
        with BuildLine():
            ThreePointArc((0, 42.5), (2.651650429, 43.59834957), (3.75, 46.25))
            ThreePointArc((3.75, 46.25), (2.651650429, 48.901650429), (0, 50))
            Line((0, 50), (0, 42.5))
        make_face()
    revolve(axis=Axis((0, 50, 0), (0, -1, 0)))

    # ｽｹｯﾁ10 → ｶｯﾄ - 押し出し1 (cut, symmetric)
    with BuildSketch(Plane(origin=(0, 0, 0), x_dir=(0, 0, -1), z_dir=(1, 0, 0))):
        with Locations((0, 46.25)):
            Circle(SKETCH_10_R)
    extrude(amount=CUT_EXTRUDE_1_DEPTH, both=True, mode=Mode.SUBTRACT)

    # 面取り1
    chamfer_1_edges = [part.edges().sort_by_distance(p)[0] for p in [
        (0, 39, -3),
    ]]
    chamfer(chamfer_1_edges, length=CHAMFER_1_SIZE - 0.0001)  # a hair under: the kernel refuses the full size


solid = part.part
